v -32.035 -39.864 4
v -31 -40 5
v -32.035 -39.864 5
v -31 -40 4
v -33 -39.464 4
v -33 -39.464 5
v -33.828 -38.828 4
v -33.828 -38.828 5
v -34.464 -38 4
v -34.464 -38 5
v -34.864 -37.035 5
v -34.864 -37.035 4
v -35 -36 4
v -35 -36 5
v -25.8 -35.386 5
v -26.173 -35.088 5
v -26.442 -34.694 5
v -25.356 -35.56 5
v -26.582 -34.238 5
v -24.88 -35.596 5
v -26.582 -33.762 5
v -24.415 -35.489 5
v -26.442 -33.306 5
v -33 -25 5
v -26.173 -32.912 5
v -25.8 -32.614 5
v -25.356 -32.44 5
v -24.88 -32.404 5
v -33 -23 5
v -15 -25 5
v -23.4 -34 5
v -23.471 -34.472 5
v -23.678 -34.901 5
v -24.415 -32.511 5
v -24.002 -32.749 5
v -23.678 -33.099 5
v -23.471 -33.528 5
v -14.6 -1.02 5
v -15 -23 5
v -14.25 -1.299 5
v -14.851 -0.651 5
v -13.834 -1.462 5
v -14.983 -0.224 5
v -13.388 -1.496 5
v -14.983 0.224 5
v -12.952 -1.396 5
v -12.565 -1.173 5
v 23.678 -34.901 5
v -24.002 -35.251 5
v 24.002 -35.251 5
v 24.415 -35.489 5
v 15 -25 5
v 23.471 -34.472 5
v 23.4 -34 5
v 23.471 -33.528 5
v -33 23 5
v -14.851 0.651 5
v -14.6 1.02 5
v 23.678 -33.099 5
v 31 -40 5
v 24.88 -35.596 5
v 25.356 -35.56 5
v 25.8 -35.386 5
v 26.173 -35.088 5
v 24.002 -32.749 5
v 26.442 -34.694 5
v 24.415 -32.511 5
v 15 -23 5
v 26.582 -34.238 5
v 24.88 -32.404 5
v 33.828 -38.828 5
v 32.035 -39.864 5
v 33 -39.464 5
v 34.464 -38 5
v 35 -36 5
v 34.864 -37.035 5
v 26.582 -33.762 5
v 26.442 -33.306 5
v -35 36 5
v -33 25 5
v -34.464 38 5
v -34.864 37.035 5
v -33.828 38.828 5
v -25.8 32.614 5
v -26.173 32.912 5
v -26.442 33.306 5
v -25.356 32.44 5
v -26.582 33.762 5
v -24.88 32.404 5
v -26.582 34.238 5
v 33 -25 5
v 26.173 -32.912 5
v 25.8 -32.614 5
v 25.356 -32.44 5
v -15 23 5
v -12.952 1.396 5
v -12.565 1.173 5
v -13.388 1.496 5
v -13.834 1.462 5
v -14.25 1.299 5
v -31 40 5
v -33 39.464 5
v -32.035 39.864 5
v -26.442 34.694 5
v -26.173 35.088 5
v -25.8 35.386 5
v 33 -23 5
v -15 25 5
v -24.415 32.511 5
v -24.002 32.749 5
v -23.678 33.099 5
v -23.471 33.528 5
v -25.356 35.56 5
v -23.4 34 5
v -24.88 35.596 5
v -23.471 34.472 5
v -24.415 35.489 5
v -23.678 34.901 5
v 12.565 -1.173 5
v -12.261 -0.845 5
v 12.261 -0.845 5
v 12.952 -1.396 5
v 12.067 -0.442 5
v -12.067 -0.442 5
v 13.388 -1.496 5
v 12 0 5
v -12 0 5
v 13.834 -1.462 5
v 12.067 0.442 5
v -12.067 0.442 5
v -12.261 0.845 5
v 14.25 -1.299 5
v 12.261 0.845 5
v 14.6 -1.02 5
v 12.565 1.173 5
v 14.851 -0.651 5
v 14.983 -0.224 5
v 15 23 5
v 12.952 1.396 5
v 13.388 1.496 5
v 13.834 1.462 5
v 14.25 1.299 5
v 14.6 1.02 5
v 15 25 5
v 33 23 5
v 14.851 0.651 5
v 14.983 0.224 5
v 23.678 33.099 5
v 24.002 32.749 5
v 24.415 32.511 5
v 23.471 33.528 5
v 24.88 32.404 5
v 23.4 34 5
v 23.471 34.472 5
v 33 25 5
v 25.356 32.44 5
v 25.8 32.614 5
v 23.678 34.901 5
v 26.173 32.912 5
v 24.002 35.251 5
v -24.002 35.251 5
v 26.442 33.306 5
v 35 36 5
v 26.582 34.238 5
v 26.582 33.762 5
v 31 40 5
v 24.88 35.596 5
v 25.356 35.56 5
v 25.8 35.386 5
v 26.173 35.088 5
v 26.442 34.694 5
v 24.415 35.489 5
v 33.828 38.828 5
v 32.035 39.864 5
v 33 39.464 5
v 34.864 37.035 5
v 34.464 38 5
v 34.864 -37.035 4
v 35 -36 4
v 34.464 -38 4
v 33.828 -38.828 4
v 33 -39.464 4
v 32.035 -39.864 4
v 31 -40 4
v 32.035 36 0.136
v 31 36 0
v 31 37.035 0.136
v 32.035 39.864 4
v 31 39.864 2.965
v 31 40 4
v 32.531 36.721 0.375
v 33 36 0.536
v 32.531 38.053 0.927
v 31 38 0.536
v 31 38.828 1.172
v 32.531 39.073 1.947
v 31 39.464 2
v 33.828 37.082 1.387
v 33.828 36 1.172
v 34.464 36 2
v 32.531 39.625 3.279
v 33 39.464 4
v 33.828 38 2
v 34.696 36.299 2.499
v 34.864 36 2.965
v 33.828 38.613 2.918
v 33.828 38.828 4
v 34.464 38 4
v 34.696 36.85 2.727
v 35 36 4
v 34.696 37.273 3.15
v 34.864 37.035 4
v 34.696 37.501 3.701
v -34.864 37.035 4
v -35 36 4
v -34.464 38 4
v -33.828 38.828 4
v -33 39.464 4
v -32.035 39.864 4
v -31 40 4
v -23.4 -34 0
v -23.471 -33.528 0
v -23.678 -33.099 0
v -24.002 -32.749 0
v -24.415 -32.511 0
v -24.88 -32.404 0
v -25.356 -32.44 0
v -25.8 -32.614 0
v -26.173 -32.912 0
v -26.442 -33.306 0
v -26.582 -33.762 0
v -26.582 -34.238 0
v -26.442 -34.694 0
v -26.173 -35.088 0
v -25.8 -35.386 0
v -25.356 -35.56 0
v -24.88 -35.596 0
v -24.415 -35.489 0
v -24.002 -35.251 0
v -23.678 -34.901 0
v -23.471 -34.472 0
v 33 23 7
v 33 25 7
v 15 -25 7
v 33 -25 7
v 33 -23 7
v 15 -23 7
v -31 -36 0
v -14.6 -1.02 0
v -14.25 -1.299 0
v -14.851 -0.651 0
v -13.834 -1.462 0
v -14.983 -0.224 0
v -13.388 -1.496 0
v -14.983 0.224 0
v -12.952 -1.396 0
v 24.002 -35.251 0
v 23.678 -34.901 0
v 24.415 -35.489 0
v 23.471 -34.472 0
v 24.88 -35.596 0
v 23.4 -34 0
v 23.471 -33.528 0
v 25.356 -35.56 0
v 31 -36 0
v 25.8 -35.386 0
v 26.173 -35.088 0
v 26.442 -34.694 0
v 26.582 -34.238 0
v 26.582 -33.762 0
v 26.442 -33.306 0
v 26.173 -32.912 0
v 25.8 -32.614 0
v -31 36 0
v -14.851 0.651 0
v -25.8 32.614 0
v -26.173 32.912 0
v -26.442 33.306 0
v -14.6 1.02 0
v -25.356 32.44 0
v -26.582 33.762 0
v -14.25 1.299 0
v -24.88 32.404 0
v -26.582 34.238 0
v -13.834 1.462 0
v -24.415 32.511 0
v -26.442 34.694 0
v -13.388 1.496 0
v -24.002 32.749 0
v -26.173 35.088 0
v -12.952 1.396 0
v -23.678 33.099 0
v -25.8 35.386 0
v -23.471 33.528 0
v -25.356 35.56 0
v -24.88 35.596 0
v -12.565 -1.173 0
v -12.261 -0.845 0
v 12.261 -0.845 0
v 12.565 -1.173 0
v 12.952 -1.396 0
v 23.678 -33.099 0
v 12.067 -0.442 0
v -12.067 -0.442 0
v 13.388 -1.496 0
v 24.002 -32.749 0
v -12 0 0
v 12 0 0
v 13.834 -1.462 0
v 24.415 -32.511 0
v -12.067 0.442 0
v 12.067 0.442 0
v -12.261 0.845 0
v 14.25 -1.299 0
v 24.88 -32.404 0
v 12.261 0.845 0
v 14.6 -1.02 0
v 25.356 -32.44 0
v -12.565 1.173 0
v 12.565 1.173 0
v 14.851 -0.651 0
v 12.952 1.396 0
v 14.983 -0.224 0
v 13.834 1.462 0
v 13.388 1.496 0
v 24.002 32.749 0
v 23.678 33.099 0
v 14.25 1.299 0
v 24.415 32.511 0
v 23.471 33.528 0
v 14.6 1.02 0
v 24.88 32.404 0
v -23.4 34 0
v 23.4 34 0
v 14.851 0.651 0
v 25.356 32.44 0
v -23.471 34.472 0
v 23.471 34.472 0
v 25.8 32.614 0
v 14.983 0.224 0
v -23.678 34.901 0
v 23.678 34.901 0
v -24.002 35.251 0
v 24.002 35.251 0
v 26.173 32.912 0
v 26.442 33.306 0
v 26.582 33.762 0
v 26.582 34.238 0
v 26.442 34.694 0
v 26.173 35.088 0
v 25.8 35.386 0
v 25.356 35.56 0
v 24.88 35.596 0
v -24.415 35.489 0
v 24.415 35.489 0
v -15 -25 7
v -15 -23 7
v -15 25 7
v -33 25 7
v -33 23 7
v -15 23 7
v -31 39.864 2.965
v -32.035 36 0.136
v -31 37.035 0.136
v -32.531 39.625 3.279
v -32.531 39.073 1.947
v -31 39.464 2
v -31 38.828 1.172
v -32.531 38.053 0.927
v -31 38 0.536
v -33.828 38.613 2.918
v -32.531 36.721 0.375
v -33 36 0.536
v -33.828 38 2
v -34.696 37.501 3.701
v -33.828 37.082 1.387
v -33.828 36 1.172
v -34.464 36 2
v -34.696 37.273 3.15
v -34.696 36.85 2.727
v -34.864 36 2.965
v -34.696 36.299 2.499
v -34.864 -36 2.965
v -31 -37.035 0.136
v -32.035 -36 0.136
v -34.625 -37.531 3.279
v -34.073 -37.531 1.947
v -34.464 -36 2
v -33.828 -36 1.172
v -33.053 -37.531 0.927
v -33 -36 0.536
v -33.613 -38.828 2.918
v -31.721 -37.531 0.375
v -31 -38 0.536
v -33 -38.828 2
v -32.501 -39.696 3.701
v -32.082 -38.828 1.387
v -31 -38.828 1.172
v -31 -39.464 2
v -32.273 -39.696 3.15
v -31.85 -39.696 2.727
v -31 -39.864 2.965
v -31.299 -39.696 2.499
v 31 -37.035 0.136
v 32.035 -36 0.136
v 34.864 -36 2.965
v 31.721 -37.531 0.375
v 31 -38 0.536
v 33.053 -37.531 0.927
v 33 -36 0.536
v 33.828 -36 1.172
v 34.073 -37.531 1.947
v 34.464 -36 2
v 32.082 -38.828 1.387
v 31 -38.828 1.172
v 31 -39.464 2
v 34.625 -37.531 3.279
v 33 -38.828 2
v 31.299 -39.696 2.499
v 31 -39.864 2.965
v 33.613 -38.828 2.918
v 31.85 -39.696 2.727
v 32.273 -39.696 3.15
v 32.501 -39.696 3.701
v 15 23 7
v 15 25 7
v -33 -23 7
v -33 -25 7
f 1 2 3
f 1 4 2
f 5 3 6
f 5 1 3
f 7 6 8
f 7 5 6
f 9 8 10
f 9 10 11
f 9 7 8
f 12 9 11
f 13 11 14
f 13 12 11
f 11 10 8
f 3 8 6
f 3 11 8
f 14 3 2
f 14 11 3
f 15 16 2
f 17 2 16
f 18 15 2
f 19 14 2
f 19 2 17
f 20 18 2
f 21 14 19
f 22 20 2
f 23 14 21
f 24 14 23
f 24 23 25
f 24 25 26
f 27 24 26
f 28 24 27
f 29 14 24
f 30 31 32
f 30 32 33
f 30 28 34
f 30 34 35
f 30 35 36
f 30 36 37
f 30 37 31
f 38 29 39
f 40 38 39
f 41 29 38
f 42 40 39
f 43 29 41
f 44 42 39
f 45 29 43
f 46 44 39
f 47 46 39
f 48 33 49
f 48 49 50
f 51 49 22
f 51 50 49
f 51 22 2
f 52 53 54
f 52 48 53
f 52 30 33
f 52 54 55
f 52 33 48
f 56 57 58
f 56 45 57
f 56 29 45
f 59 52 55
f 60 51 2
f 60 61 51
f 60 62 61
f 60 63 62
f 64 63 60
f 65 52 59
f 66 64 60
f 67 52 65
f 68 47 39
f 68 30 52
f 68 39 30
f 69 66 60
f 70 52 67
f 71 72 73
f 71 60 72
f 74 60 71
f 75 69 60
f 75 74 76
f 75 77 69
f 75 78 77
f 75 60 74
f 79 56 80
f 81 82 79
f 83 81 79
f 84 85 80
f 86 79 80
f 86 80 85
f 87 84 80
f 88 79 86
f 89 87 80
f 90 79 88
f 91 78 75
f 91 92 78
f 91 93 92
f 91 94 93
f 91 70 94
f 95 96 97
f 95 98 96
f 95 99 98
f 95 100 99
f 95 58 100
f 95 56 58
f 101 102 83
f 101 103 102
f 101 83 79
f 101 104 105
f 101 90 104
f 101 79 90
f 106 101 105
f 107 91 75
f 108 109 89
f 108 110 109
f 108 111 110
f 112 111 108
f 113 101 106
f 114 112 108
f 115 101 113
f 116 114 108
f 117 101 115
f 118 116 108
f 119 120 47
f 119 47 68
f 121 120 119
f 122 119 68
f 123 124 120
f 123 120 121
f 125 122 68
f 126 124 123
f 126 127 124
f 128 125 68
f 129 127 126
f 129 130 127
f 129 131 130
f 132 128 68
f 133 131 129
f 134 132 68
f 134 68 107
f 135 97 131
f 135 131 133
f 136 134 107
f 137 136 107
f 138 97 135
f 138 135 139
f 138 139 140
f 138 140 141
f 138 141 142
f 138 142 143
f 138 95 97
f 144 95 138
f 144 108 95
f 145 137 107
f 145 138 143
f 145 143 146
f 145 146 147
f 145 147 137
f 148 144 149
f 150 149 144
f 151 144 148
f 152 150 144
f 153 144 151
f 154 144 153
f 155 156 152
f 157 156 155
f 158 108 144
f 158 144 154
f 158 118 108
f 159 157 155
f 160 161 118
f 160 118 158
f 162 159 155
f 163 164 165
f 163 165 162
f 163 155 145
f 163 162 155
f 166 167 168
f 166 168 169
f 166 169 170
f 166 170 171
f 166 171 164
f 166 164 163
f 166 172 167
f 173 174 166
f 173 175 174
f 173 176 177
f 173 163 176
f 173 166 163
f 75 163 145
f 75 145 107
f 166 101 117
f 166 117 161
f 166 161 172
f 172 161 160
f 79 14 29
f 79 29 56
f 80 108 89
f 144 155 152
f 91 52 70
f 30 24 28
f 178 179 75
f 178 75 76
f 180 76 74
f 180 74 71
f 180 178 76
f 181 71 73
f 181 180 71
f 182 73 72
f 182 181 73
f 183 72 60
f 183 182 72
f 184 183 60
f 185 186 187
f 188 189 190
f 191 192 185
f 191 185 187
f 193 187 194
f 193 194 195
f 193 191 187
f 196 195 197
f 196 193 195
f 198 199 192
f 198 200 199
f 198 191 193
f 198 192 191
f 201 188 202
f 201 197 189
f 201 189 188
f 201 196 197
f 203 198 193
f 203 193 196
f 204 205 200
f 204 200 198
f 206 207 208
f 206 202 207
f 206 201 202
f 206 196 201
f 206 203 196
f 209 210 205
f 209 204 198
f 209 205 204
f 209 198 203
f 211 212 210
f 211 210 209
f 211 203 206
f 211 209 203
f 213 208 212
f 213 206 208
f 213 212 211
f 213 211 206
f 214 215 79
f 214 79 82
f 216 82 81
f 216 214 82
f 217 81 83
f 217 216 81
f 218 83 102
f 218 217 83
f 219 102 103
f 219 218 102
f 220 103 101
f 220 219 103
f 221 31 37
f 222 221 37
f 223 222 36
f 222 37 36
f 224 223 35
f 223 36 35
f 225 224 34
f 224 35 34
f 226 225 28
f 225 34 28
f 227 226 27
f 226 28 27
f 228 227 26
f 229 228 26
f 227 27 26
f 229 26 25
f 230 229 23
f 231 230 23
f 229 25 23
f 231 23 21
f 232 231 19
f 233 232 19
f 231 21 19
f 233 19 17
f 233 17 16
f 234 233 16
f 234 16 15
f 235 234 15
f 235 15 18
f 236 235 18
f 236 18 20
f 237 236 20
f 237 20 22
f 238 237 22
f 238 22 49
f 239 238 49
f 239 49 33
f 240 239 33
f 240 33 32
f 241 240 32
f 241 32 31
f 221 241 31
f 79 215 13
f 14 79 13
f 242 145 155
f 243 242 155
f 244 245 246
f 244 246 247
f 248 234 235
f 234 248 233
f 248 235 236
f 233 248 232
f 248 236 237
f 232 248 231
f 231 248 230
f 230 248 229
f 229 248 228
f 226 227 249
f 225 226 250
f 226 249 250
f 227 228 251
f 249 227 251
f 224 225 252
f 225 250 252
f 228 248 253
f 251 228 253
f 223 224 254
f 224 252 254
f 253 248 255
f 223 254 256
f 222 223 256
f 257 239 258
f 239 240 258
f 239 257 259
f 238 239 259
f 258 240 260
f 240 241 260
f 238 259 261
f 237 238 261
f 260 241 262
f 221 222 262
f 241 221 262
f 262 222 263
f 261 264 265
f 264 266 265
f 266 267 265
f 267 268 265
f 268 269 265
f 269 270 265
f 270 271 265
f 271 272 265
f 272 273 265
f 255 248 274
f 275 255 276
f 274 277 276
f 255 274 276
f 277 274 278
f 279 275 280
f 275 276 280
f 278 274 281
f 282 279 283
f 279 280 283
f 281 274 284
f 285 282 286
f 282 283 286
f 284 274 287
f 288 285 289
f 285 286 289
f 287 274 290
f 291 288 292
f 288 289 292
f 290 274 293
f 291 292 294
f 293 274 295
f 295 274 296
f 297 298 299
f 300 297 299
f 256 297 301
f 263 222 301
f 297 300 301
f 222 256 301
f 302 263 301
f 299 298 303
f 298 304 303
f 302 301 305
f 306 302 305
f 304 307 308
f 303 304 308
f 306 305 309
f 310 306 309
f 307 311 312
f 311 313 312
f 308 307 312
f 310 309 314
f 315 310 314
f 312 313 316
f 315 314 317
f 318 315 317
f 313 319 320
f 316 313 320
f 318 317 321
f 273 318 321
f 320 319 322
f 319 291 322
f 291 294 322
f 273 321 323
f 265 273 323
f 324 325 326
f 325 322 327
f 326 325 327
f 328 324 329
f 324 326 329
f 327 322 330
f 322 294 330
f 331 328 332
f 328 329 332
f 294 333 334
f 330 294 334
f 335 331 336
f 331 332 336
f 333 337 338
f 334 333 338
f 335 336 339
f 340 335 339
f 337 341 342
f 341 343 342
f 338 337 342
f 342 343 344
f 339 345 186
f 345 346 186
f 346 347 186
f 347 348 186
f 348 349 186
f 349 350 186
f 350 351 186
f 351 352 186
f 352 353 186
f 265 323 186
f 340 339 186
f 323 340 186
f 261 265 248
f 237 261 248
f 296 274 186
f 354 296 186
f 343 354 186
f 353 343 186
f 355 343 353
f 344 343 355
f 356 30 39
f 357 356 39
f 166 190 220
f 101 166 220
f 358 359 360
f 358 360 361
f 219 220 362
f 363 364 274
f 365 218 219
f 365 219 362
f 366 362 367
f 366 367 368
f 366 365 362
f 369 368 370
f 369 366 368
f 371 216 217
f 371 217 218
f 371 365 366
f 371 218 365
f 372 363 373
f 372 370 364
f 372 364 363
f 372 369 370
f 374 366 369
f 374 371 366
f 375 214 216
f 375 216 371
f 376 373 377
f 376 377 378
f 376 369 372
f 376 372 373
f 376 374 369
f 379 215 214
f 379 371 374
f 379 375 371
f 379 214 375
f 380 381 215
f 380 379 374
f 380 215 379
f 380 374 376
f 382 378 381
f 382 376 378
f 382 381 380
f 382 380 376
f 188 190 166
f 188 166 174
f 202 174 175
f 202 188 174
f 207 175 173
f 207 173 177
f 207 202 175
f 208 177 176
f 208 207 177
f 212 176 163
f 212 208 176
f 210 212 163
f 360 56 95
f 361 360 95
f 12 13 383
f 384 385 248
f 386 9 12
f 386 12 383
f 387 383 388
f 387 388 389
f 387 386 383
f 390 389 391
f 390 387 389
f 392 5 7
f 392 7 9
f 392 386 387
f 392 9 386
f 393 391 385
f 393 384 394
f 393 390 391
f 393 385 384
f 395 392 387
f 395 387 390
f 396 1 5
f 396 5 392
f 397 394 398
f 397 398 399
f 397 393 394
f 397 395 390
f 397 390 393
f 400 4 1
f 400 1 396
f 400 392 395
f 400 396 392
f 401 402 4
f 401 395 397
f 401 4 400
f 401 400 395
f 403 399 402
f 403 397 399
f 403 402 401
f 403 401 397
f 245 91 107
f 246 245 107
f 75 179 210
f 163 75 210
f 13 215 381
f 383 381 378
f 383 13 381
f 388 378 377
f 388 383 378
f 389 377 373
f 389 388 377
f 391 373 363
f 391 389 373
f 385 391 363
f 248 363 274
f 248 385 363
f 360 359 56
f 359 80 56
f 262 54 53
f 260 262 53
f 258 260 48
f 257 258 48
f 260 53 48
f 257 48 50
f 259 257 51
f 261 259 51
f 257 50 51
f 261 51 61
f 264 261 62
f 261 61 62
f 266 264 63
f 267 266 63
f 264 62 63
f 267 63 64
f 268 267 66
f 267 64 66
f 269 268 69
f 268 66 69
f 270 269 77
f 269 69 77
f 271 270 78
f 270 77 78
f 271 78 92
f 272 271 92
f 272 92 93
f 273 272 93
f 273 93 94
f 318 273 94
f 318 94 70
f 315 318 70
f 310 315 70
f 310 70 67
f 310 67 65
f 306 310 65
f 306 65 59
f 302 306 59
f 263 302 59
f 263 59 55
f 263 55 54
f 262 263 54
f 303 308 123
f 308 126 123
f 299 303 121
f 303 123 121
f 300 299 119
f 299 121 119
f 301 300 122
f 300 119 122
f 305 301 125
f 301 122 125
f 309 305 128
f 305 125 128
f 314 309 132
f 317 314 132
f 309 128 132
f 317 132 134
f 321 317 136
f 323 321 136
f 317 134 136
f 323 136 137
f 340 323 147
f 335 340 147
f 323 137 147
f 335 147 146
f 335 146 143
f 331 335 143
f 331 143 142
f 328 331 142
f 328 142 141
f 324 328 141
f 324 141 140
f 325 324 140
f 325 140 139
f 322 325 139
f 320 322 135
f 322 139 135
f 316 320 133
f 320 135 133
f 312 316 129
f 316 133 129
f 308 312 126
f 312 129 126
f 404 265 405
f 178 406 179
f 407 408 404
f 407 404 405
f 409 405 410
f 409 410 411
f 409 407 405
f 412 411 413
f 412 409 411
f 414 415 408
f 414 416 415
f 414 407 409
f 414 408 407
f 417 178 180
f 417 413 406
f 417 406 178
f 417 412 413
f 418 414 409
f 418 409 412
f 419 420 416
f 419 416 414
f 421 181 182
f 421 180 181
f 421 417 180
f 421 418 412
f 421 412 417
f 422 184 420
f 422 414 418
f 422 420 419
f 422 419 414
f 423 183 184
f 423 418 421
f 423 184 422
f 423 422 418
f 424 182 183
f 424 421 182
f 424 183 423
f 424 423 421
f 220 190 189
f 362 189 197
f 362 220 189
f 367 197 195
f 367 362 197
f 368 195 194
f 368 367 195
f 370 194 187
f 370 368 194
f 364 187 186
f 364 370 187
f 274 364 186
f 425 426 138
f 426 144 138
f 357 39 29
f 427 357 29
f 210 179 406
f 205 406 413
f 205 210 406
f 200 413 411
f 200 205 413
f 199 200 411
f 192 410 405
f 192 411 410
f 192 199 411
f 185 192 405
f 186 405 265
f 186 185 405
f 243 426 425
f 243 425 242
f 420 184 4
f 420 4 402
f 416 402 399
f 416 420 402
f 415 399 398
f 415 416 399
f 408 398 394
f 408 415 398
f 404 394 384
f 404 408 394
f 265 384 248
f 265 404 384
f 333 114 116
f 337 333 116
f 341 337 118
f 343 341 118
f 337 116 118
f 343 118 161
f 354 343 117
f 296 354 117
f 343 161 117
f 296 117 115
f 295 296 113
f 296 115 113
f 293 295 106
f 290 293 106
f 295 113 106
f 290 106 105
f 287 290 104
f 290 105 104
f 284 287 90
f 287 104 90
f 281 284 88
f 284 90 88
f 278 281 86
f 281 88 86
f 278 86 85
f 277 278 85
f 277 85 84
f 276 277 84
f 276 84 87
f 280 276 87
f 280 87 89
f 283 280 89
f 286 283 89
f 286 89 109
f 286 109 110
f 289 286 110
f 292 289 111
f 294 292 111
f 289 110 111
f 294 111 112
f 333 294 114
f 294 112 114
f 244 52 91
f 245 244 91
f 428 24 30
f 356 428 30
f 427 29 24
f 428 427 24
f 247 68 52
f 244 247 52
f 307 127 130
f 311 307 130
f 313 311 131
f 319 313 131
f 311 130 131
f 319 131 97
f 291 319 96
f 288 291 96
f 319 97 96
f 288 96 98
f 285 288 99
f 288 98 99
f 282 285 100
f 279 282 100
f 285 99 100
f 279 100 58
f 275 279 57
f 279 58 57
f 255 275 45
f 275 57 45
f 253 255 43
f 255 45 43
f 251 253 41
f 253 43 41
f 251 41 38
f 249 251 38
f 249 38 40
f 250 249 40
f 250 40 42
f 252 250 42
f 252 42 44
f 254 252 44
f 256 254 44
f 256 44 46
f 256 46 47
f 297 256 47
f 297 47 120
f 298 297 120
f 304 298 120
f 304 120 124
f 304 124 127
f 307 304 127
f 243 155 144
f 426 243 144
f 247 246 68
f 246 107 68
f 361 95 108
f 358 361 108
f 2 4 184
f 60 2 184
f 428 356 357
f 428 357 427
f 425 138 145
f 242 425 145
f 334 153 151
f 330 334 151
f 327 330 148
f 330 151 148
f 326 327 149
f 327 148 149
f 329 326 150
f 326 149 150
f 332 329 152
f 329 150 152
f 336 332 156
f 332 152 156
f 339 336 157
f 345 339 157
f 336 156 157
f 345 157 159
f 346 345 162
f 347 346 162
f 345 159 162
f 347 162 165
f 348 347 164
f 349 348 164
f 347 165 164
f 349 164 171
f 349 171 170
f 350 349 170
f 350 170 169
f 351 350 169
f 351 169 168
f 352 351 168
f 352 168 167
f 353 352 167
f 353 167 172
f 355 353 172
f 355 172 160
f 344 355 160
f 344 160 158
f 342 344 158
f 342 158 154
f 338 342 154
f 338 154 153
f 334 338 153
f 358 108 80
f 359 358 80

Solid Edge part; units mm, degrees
sketch "Sketch1" plane through (0, 0, 0) normal (0, 0, 1) x (1, 0, 0)
  line L0 (-35, -40) -> (35, -40)
  line L1 (35, -40) -> (35, 40)
  line L2 (35, 40) -> (-35, 40)
  line L3 (-35, 40) -> (-35, -40)
  dimension "D1" = 80
  dimension "D2" = 70
extrude "Protrusion1" add sketch "Sketch1" along normal blind 5
sketch "Sketch2" plane through (0, 0, 5) normal (0, 0, 1) x (1, 0, 0)
  circle A0 centre (-25, 34) radius 1.6
  dimension "D1" = 6
  dimension "D2" = 10
  dimension "D3" = 3.2
extrude "Cutout1" cut sketch "Sketch2" against normal through all
mirror "Mirror1" about plane through (0, 0, 0) normal (1, 0, 0) of "Cutout1"
mirror "Mirror2" about plane through (0, 0, 0) normal (0, -1, 0) of "Cutout1", "Mirror1"
sketch "Sketch3" plane through (0, 0, 5) normal (0, 0, 1) x (1, 0, 0)
  circle A0 centre (-13.5, 0) radius 1.5
  dimension "D1" = 3
  dimension "D2" = 13.5
extrude "Cutout2" cut sketch "Sketch3" against normal through all
mirror "Mirror3" about plane through (0, 0, 0) normal (1, 0, 0) of "Cutout2"
sketch "Sketch4" plane through (0, 0, 5) normal (0, 0, 1) x (1, 0, 0)
  line L0 (-33, 23) -> (-15, 23)
  line L1 (-15, 23) -> (-15, 25)
  line L2 (-15, 25) -> (-33, 25)
  line L3 (-33, 25) -> (-33, 23)
  dimension "D1" = 18
  dimension "D2" = 2
  dimension "D3" = 2
  dimension "D4" = 15
extrude "Extrusionsausprägung_2" add sketch "Sketch4" along normal blind 2
mirror "Mirror4" about plane through (0, 0, 0) normal (0, -1, 0) of "Extrusionsausprägung_2"
mirror "Mirror5" about plane through (0, 0, 0) normal (1, 0, 0) of "Mirror4", "Extrusionsausprägung_2"
fillet "Verrundung_1" radius 4 4 edges at (0, 40, 0) (35, 0, 0) (-35, 0, 0) (0, -40, 0)
fillet "Verrundung_2" radius 4 8 edges at (33.8284, 38.8284, 1.1716) (35, 40, 4.5) (33.8284, -38.8284, 1.1716) (35, -40, 4.5) (-33.8284, -38.8284, 1.1716) (-35, -40, 4.5) (-33.8284, 38.8284, 1.1716) (-35, 40, 4.5)
properties material "Nylon, allgemein"
